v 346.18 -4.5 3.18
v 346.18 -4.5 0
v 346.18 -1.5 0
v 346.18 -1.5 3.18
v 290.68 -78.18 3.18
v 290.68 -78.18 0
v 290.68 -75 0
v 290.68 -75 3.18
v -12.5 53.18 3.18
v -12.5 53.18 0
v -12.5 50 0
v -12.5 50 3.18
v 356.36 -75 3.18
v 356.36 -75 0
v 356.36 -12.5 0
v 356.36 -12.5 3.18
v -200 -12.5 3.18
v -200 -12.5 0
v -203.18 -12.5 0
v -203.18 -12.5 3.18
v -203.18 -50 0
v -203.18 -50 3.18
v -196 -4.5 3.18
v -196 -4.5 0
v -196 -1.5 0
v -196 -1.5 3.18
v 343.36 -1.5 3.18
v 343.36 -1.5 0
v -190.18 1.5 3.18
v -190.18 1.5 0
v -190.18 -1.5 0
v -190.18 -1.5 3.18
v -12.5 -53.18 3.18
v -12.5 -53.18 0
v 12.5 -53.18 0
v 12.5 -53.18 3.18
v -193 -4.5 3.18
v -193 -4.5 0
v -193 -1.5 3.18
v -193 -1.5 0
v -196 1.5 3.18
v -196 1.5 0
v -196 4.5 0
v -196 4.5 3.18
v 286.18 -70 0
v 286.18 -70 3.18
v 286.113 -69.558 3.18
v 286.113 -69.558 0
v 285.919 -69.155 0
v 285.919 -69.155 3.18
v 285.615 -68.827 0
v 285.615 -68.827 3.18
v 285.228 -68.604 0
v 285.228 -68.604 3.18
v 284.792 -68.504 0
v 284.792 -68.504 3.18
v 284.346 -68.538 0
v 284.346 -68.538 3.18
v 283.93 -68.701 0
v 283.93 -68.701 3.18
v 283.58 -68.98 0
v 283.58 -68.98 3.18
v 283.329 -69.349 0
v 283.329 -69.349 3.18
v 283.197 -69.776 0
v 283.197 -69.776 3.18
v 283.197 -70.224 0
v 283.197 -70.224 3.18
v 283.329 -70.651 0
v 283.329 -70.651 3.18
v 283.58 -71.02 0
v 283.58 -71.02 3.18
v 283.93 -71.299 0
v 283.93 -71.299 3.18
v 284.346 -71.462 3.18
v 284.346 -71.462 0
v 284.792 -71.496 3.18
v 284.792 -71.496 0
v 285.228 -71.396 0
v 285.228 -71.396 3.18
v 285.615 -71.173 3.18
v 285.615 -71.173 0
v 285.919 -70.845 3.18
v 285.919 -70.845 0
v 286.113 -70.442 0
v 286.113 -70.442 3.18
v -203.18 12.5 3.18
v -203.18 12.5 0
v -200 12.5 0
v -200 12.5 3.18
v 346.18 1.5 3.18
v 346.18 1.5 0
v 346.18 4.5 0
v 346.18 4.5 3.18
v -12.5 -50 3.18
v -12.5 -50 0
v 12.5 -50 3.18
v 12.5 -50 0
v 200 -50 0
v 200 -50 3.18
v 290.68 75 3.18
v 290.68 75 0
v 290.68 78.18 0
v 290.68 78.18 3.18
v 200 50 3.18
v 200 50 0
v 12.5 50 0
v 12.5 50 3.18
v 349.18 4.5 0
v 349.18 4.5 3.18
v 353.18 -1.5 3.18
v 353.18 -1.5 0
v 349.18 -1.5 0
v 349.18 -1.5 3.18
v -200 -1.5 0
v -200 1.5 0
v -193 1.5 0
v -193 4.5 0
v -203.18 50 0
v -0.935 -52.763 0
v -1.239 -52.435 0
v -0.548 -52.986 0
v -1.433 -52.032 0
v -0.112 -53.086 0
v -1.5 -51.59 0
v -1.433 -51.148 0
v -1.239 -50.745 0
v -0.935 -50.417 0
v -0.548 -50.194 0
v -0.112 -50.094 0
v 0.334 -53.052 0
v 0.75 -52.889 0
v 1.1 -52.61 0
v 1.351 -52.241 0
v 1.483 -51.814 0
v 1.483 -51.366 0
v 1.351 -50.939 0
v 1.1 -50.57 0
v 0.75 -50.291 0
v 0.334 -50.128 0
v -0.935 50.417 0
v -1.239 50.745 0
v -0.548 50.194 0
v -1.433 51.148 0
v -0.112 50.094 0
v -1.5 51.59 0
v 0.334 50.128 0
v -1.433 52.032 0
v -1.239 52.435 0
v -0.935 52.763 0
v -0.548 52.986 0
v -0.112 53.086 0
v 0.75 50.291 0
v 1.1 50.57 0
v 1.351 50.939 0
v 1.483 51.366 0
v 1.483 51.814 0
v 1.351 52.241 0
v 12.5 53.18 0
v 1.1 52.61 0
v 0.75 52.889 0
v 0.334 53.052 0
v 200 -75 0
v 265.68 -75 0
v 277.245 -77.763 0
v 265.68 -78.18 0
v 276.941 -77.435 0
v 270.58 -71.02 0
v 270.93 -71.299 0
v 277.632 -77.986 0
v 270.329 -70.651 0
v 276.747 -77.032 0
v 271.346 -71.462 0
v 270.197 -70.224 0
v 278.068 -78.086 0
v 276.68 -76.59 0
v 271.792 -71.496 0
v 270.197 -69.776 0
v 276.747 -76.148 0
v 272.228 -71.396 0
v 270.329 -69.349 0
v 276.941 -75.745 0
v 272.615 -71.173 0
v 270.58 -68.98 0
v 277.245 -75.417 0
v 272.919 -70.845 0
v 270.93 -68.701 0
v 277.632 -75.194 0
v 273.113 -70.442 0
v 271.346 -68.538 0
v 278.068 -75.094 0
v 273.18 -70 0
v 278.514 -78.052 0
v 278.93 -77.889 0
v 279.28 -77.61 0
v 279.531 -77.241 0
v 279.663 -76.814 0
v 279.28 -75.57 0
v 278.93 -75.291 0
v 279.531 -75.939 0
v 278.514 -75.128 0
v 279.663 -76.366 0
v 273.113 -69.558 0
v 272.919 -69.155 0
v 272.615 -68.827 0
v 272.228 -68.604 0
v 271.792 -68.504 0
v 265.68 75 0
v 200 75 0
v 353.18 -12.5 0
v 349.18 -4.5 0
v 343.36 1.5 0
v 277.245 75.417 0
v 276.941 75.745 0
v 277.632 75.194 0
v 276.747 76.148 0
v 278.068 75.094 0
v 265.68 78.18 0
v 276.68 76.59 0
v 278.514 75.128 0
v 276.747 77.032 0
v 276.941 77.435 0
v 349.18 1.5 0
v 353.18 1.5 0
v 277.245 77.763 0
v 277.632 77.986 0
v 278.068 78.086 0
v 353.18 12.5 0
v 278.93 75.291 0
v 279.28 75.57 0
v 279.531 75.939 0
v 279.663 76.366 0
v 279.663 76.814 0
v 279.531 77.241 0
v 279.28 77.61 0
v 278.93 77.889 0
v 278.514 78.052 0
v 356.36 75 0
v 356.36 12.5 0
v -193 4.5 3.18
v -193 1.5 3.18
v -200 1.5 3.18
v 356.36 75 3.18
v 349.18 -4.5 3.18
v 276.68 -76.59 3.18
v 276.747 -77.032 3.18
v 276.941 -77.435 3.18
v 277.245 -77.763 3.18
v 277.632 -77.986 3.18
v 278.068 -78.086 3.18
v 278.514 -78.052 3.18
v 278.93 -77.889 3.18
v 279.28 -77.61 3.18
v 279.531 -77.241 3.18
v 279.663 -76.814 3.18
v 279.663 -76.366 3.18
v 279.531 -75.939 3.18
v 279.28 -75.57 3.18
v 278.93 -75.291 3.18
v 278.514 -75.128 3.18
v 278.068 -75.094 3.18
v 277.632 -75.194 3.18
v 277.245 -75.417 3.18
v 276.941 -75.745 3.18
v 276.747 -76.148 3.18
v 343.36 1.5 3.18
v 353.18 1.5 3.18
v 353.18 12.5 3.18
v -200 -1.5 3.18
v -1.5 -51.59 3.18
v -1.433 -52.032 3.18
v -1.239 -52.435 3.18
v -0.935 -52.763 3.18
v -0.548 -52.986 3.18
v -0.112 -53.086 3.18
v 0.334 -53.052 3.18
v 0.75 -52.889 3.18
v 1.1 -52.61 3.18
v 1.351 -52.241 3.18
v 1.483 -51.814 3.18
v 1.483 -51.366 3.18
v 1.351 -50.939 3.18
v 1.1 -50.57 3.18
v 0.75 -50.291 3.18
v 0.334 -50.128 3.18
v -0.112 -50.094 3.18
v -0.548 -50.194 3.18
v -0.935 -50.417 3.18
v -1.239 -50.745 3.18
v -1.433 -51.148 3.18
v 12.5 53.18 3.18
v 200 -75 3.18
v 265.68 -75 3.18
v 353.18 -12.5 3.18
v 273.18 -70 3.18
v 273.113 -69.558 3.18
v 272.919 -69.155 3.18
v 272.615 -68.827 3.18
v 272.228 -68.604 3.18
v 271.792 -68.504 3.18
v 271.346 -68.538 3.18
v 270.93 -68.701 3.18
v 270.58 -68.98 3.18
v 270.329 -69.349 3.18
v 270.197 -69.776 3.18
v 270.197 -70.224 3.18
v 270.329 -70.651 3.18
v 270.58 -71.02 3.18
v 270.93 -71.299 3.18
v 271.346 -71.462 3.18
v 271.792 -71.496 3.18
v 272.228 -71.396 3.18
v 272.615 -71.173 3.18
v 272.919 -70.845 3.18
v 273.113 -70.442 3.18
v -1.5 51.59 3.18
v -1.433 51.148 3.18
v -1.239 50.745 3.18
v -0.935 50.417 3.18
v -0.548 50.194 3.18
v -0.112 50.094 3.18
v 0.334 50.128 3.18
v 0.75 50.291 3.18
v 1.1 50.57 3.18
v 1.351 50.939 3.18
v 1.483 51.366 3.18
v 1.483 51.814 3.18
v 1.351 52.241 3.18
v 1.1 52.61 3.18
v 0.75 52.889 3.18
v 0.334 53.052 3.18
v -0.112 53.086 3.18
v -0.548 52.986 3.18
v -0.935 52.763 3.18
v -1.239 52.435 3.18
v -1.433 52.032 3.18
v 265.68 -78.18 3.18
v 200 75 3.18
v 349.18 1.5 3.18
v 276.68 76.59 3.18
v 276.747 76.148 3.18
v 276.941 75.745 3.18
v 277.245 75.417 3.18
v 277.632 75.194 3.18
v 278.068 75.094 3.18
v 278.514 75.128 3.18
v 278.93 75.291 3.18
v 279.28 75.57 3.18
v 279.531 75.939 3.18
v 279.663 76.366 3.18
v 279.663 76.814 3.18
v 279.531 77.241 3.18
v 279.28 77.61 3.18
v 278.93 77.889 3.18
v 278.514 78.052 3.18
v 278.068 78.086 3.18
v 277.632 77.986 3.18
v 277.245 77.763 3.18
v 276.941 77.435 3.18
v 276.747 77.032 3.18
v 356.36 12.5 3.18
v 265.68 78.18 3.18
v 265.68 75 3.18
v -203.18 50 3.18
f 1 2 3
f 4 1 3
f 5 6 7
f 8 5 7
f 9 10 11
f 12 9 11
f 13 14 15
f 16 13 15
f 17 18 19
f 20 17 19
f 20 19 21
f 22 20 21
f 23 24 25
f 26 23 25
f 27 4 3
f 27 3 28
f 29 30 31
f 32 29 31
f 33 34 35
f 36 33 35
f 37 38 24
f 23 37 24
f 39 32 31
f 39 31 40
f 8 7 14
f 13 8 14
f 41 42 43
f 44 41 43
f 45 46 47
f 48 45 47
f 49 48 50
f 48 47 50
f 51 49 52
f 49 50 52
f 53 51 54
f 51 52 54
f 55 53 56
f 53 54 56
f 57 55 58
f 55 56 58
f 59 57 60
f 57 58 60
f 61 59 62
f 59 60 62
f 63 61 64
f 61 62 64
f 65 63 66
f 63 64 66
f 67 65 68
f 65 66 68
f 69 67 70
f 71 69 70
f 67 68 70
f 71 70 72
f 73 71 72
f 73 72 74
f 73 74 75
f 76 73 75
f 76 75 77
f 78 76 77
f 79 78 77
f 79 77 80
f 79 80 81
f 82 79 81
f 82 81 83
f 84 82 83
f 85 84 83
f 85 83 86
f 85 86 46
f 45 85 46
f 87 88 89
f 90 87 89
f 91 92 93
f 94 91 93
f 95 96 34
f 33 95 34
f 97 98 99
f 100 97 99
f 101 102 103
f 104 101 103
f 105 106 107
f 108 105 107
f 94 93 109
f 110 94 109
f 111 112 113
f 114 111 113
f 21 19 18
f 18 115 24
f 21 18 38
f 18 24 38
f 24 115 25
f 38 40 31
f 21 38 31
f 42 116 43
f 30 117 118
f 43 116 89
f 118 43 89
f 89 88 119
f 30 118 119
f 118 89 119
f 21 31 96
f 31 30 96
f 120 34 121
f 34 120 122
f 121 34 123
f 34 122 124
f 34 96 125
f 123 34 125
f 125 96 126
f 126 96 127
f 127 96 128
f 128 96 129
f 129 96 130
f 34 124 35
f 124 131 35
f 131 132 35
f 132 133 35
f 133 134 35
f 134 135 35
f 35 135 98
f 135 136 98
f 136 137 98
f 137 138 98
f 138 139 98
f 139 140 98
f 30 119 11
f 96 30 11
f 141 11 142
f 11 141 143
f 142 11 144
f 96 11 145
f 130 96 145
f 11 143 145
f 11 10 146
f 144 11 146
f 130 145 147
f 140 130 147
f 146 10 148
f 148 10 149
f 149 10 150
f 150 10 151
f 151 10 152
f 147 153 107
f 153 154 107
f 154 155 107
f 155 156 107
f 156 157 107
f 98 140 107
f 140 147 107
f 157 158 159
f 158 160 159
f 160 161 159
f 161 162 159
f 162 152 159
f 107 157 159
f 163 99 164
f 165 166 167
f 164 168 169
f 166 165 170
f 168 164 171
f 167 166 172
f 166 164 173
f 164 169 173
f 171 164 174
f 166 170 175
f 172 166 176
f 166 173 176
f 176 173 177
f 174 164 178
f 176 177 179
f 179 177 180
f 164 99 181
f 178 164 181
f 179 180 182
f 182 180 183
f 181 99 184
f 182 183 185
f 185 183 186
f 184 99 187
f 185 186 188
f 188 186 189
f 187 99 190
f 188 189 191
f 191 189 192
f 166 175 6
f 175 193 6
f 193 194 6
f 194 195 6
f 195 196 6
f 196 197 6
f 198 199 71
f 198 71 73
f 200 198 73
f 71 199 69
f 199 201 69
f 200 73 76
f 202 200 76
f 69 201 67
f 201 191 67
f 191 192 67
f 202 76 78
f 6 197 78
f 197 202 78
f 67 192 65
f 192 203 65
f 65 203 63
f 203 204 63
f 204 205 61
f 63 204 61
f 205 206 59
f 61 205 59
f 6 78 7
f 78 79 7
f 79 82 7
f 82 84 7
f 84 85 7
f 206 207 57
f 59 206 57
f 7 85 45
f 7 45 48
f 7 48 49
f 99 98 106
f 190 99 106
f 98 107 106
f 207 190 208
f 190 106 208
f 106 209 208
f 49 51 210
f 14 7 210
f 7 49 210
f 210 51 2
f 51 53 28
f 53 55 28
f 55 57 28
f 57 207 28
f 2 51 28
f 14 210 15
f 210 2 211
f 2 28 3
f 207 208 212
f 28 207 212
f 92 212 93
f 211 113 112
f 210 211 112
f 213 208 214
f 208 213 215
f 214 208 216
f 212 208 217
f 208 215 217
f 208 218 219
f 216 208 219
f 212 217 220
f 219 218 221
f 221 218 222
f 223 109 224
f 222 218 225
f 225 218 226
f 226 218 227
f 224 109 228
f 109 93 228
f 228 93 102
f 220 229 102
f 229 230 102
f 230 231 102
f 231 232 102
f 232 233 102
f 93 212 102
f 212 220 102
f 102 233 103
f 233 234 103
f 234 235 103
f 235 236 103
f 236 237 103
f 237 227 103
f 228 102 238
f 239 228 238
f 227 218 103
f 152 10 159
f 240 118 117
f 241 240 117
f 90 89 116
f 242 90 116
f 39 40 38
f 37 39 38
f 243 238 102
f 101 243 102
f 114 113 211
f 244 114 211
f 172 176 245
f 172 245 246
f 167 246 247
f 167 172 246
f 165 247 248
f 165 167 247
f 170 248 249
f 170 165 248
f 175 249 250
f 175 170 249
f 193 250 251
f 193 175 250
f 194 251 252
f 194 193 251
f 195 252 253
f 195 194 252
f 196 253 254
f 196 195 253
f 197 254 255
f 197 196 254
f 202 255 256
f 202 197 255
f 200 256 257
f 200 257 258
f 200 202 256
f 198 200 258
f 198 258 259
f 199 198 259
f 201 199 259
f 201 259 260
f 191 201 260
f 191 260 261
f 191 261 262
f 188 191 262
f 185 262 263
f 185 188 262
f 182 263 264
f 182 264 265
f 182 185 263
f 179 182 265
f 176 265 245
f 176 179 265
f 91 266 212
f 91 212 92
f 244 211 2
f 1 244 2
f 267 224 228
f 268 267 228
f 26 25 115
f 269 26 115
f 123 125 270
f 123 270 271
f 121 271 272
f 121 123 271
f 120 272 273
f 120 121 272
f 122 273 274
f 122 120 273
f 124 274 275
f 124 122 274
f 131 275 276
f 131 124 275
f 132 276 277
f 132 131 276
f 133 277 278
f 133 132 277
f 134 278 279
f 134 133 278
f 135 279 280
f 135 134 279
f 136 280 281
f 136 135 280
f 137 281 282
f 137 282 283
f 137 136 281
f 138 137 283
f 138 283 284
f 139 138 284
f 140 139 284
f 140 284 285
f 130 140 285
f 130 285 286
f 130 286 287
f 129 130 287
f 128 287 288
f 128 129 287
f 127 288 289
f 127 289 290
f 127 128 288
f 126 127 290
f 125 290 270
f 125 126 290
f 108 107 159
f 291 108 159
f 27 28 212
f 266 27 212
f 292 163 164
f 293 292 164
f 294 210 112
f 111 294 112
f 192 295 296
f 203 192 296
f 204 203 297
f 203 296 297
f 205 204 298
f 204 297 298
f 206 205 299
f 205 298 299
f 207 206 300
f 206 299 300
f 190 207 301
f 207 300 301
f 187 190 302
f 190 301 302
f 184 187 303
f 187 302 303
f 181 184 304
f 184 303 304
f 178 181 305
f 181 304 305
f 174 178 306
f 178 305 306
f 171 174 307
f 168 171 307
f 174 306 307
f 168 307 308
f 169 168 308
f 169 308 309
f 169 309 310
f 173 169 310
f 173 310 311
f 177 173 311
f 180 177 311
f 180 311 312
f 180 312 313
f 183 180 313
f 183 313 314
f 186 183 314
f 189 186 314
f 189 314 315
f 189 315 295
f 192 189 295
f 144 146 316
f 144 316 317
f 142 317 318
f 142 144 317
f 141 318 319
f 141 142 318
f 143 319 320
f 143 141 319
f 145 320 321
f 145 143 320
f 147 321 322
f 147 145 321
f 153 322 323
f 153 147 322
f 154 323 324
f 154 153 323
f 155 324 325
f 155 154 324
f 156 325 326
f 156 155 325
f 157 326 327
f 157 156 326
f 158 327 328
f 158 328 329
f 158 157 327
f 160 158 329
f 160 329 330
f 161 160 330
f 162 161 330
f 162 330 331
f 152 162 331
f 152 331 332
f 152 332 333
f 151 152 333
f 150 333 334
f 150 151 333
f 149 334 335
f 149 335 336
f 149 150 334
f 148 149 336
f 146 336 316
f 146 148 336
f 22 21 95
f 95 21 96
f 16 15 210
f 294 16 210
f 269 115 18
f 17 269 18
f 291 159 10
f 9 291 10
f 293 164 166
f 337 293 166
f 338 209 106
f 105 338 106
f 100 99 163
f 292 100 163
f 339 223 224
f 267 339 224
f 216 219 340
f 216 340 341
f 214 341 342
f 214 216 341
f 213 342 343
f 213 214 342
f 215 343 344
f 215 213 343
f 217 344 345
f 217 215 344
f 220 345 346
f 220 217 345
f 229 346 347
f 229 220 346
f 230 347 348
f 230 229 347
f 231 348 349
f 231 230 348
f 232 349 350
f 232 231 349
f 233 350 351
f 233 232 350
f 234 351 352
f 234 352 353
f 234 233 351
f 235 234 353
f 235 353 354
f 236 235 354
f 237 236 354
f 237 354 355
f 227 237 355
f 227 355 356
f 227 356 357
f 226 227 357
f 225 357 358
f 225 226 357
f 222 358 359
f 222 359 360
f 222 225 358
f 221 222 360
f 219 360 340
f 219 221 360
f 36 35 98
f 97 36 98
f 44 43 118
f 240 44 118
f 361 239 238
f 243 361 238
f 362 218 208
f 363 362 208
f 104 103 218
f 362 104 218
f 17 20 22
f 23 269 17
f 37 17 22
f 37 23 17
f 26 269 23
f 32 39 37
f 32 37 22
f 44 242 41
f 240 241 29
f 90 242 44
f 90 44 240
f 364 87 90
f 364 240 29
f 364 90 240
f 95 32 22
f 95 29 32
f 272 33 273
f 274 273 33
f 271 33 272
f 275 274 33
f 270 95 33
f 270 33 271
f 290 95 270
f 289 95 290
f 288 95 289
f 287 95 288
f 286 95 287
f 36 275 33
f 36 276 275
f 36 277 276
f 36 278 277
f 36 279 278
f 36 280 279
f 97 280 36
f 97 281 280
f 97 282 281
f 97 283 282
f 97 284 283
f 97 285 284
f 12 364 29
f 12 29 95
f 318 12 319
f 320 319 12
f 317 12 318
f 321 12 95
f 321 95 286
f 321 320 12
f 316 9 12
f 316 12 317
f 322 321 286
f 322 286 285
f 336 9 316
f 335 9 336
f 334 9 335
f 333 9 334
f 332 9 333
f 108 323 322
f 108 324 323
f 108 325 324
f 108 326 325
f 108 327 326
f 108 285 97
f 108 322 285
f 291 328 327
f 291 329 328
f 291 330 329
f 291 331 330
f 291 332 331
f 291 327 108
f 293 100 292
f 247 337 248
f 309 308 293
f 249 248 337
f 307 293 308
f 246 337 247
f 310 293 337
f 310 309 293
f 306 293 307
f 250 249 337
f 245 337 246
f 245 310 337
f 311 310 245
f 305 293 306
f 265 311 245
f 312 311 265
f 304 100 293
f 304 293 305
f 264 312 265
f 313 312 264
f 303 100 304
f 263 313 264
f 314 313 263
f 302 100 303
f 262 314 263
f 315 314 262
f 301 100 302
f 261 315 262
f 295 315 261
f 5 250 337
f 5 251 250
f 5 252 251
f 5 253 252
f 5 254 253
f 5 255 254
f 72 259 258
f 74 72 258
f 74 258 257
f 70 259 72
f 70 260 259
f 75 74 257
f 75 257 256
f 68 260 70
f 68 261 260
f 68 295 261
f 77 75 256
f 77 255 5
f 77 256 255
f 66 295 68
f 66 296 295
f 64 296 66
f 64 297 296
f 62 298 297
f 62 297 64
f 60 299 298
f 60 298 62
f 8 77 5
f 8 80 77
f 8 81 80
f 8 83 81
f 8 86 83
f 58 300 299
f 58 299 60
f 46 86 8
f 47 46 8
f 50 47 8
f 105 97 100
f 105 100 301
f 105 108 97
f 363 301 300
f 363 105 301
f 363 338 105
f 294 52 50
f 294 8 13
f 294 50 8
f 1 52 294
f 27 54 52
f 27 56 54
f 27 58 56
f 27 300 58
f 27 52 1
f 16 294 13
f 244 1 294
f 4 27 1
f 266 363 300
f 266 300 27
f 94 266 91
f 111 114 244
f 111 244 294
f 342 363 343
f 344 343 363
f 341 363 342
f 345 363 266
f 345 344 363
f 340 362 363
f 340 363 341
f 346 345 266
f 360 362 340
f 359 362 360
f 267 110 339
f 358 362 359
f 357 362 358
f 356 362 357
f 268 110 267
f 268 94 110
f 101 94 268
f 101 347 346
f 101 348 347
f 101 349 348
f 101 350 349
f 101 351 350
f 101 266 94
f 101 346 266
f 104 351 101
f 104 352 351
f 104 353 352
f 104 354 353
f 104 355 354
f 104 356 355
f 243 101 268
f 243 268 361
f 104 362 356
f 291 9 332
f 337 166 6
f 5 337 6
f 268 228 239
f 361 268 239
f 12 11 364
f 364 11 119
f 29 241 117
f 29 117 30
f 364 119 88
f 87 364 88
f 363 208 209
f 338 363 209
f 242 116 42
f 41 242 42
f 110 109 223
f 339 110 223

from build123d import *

# Parameters (mm, degrees)
SKETCH1_R           = 1.5
BOSS_EXTRUDE1_DEPTH = 3.18
SKETCH2_R           = 1.5
CUT_EXTRUDE1_DEPTH  = 10


with BuildPart() as part:
    # Sketch1 → Boss-Extrude1 (new body)
    with BuildSketch(Plane.XY):
        Polygon((-203.18, 50), (-203.18, 12.5), (-200, 12.5), (-200, 1.5), (-196, 1.5), (-196, 4.5), (-193, 4.5), (-193, 1.5), (-190.18, 1.5), (-190.18, -1.5), (-193, -1.5), (-193, -4.5), (-196, -4.5), (-196, -1.5), (-200, -1.5), (-200, -12.5), (-203.18, -12.5), (-203.18, -50), (-12.5, -50), (-12.5, -53.18), (12.5, -53.18), (12.5, -50), (200, -50), (200, -75), (265.68, -75), (265.68, -78.18), (290.68, -78.18), (290.68, -75), (356.36, -75), (356.36, -12.5), (353.18, -12.5), (353.18, -1.5), (349.18, -1.5), (349.18, -4.5), (346.18, -4.5), (346.18, -1.5), (343.36, -1.5), (343.36, 1.5), (346.18, 1.5), (346.18, 4.5), (349.18, 4.5), (349.18, 1.5), (353.18, 1.5), (353.18, 12.5), (356.36, 12.5), (356.36, 75), (290.68, 75), (290.68, 78.18), (265.68, 78.18), (265.68, 75), (200, 75), (200, 50), (12.5, 50), (12.5, 53.18), (-12.5, 53.18), (-12.5, 50), align=None)
        with Locations(Location((0, -51.59, 0), (0, 0, 180))):
            Circle(SKETCH1_R, mode=Mode.SUBTRACT)
        with Locations(Location((0, 51.59, 0), (0, 0, 180))):
            Circle(SKETCH1_R, mode=Mode.SUBTRACT)
        with Locations(Location((278.18, -76.59, 0), (0, 0, 180))):
            Circle(SKETCH1_R, mode=Mode.SUBTRACT)
        with Locations(Location((278.18, 76.59, 0), (0, 0, 180))):
            Circle(SKETCH1_R, mode=Mode.SUBTRACT)
    extrude(amount=BOSS_EXTRUDE1_DEPTH)

    # Sketch2 → Cut-Extrude1 (cut)
    with BuildSketch(Plane.XY.offset(3.18)):
        with Locations((284.68, -70)):
            Circle(SKETCH2_R)
        with Locations((271.68, -70)):
            Circle(SKETCH2_R)
    extrude(amount=-CUT_EXTRUDE1_DEPTH, mode=Mode.SUBTRACT)


solid = part.part
